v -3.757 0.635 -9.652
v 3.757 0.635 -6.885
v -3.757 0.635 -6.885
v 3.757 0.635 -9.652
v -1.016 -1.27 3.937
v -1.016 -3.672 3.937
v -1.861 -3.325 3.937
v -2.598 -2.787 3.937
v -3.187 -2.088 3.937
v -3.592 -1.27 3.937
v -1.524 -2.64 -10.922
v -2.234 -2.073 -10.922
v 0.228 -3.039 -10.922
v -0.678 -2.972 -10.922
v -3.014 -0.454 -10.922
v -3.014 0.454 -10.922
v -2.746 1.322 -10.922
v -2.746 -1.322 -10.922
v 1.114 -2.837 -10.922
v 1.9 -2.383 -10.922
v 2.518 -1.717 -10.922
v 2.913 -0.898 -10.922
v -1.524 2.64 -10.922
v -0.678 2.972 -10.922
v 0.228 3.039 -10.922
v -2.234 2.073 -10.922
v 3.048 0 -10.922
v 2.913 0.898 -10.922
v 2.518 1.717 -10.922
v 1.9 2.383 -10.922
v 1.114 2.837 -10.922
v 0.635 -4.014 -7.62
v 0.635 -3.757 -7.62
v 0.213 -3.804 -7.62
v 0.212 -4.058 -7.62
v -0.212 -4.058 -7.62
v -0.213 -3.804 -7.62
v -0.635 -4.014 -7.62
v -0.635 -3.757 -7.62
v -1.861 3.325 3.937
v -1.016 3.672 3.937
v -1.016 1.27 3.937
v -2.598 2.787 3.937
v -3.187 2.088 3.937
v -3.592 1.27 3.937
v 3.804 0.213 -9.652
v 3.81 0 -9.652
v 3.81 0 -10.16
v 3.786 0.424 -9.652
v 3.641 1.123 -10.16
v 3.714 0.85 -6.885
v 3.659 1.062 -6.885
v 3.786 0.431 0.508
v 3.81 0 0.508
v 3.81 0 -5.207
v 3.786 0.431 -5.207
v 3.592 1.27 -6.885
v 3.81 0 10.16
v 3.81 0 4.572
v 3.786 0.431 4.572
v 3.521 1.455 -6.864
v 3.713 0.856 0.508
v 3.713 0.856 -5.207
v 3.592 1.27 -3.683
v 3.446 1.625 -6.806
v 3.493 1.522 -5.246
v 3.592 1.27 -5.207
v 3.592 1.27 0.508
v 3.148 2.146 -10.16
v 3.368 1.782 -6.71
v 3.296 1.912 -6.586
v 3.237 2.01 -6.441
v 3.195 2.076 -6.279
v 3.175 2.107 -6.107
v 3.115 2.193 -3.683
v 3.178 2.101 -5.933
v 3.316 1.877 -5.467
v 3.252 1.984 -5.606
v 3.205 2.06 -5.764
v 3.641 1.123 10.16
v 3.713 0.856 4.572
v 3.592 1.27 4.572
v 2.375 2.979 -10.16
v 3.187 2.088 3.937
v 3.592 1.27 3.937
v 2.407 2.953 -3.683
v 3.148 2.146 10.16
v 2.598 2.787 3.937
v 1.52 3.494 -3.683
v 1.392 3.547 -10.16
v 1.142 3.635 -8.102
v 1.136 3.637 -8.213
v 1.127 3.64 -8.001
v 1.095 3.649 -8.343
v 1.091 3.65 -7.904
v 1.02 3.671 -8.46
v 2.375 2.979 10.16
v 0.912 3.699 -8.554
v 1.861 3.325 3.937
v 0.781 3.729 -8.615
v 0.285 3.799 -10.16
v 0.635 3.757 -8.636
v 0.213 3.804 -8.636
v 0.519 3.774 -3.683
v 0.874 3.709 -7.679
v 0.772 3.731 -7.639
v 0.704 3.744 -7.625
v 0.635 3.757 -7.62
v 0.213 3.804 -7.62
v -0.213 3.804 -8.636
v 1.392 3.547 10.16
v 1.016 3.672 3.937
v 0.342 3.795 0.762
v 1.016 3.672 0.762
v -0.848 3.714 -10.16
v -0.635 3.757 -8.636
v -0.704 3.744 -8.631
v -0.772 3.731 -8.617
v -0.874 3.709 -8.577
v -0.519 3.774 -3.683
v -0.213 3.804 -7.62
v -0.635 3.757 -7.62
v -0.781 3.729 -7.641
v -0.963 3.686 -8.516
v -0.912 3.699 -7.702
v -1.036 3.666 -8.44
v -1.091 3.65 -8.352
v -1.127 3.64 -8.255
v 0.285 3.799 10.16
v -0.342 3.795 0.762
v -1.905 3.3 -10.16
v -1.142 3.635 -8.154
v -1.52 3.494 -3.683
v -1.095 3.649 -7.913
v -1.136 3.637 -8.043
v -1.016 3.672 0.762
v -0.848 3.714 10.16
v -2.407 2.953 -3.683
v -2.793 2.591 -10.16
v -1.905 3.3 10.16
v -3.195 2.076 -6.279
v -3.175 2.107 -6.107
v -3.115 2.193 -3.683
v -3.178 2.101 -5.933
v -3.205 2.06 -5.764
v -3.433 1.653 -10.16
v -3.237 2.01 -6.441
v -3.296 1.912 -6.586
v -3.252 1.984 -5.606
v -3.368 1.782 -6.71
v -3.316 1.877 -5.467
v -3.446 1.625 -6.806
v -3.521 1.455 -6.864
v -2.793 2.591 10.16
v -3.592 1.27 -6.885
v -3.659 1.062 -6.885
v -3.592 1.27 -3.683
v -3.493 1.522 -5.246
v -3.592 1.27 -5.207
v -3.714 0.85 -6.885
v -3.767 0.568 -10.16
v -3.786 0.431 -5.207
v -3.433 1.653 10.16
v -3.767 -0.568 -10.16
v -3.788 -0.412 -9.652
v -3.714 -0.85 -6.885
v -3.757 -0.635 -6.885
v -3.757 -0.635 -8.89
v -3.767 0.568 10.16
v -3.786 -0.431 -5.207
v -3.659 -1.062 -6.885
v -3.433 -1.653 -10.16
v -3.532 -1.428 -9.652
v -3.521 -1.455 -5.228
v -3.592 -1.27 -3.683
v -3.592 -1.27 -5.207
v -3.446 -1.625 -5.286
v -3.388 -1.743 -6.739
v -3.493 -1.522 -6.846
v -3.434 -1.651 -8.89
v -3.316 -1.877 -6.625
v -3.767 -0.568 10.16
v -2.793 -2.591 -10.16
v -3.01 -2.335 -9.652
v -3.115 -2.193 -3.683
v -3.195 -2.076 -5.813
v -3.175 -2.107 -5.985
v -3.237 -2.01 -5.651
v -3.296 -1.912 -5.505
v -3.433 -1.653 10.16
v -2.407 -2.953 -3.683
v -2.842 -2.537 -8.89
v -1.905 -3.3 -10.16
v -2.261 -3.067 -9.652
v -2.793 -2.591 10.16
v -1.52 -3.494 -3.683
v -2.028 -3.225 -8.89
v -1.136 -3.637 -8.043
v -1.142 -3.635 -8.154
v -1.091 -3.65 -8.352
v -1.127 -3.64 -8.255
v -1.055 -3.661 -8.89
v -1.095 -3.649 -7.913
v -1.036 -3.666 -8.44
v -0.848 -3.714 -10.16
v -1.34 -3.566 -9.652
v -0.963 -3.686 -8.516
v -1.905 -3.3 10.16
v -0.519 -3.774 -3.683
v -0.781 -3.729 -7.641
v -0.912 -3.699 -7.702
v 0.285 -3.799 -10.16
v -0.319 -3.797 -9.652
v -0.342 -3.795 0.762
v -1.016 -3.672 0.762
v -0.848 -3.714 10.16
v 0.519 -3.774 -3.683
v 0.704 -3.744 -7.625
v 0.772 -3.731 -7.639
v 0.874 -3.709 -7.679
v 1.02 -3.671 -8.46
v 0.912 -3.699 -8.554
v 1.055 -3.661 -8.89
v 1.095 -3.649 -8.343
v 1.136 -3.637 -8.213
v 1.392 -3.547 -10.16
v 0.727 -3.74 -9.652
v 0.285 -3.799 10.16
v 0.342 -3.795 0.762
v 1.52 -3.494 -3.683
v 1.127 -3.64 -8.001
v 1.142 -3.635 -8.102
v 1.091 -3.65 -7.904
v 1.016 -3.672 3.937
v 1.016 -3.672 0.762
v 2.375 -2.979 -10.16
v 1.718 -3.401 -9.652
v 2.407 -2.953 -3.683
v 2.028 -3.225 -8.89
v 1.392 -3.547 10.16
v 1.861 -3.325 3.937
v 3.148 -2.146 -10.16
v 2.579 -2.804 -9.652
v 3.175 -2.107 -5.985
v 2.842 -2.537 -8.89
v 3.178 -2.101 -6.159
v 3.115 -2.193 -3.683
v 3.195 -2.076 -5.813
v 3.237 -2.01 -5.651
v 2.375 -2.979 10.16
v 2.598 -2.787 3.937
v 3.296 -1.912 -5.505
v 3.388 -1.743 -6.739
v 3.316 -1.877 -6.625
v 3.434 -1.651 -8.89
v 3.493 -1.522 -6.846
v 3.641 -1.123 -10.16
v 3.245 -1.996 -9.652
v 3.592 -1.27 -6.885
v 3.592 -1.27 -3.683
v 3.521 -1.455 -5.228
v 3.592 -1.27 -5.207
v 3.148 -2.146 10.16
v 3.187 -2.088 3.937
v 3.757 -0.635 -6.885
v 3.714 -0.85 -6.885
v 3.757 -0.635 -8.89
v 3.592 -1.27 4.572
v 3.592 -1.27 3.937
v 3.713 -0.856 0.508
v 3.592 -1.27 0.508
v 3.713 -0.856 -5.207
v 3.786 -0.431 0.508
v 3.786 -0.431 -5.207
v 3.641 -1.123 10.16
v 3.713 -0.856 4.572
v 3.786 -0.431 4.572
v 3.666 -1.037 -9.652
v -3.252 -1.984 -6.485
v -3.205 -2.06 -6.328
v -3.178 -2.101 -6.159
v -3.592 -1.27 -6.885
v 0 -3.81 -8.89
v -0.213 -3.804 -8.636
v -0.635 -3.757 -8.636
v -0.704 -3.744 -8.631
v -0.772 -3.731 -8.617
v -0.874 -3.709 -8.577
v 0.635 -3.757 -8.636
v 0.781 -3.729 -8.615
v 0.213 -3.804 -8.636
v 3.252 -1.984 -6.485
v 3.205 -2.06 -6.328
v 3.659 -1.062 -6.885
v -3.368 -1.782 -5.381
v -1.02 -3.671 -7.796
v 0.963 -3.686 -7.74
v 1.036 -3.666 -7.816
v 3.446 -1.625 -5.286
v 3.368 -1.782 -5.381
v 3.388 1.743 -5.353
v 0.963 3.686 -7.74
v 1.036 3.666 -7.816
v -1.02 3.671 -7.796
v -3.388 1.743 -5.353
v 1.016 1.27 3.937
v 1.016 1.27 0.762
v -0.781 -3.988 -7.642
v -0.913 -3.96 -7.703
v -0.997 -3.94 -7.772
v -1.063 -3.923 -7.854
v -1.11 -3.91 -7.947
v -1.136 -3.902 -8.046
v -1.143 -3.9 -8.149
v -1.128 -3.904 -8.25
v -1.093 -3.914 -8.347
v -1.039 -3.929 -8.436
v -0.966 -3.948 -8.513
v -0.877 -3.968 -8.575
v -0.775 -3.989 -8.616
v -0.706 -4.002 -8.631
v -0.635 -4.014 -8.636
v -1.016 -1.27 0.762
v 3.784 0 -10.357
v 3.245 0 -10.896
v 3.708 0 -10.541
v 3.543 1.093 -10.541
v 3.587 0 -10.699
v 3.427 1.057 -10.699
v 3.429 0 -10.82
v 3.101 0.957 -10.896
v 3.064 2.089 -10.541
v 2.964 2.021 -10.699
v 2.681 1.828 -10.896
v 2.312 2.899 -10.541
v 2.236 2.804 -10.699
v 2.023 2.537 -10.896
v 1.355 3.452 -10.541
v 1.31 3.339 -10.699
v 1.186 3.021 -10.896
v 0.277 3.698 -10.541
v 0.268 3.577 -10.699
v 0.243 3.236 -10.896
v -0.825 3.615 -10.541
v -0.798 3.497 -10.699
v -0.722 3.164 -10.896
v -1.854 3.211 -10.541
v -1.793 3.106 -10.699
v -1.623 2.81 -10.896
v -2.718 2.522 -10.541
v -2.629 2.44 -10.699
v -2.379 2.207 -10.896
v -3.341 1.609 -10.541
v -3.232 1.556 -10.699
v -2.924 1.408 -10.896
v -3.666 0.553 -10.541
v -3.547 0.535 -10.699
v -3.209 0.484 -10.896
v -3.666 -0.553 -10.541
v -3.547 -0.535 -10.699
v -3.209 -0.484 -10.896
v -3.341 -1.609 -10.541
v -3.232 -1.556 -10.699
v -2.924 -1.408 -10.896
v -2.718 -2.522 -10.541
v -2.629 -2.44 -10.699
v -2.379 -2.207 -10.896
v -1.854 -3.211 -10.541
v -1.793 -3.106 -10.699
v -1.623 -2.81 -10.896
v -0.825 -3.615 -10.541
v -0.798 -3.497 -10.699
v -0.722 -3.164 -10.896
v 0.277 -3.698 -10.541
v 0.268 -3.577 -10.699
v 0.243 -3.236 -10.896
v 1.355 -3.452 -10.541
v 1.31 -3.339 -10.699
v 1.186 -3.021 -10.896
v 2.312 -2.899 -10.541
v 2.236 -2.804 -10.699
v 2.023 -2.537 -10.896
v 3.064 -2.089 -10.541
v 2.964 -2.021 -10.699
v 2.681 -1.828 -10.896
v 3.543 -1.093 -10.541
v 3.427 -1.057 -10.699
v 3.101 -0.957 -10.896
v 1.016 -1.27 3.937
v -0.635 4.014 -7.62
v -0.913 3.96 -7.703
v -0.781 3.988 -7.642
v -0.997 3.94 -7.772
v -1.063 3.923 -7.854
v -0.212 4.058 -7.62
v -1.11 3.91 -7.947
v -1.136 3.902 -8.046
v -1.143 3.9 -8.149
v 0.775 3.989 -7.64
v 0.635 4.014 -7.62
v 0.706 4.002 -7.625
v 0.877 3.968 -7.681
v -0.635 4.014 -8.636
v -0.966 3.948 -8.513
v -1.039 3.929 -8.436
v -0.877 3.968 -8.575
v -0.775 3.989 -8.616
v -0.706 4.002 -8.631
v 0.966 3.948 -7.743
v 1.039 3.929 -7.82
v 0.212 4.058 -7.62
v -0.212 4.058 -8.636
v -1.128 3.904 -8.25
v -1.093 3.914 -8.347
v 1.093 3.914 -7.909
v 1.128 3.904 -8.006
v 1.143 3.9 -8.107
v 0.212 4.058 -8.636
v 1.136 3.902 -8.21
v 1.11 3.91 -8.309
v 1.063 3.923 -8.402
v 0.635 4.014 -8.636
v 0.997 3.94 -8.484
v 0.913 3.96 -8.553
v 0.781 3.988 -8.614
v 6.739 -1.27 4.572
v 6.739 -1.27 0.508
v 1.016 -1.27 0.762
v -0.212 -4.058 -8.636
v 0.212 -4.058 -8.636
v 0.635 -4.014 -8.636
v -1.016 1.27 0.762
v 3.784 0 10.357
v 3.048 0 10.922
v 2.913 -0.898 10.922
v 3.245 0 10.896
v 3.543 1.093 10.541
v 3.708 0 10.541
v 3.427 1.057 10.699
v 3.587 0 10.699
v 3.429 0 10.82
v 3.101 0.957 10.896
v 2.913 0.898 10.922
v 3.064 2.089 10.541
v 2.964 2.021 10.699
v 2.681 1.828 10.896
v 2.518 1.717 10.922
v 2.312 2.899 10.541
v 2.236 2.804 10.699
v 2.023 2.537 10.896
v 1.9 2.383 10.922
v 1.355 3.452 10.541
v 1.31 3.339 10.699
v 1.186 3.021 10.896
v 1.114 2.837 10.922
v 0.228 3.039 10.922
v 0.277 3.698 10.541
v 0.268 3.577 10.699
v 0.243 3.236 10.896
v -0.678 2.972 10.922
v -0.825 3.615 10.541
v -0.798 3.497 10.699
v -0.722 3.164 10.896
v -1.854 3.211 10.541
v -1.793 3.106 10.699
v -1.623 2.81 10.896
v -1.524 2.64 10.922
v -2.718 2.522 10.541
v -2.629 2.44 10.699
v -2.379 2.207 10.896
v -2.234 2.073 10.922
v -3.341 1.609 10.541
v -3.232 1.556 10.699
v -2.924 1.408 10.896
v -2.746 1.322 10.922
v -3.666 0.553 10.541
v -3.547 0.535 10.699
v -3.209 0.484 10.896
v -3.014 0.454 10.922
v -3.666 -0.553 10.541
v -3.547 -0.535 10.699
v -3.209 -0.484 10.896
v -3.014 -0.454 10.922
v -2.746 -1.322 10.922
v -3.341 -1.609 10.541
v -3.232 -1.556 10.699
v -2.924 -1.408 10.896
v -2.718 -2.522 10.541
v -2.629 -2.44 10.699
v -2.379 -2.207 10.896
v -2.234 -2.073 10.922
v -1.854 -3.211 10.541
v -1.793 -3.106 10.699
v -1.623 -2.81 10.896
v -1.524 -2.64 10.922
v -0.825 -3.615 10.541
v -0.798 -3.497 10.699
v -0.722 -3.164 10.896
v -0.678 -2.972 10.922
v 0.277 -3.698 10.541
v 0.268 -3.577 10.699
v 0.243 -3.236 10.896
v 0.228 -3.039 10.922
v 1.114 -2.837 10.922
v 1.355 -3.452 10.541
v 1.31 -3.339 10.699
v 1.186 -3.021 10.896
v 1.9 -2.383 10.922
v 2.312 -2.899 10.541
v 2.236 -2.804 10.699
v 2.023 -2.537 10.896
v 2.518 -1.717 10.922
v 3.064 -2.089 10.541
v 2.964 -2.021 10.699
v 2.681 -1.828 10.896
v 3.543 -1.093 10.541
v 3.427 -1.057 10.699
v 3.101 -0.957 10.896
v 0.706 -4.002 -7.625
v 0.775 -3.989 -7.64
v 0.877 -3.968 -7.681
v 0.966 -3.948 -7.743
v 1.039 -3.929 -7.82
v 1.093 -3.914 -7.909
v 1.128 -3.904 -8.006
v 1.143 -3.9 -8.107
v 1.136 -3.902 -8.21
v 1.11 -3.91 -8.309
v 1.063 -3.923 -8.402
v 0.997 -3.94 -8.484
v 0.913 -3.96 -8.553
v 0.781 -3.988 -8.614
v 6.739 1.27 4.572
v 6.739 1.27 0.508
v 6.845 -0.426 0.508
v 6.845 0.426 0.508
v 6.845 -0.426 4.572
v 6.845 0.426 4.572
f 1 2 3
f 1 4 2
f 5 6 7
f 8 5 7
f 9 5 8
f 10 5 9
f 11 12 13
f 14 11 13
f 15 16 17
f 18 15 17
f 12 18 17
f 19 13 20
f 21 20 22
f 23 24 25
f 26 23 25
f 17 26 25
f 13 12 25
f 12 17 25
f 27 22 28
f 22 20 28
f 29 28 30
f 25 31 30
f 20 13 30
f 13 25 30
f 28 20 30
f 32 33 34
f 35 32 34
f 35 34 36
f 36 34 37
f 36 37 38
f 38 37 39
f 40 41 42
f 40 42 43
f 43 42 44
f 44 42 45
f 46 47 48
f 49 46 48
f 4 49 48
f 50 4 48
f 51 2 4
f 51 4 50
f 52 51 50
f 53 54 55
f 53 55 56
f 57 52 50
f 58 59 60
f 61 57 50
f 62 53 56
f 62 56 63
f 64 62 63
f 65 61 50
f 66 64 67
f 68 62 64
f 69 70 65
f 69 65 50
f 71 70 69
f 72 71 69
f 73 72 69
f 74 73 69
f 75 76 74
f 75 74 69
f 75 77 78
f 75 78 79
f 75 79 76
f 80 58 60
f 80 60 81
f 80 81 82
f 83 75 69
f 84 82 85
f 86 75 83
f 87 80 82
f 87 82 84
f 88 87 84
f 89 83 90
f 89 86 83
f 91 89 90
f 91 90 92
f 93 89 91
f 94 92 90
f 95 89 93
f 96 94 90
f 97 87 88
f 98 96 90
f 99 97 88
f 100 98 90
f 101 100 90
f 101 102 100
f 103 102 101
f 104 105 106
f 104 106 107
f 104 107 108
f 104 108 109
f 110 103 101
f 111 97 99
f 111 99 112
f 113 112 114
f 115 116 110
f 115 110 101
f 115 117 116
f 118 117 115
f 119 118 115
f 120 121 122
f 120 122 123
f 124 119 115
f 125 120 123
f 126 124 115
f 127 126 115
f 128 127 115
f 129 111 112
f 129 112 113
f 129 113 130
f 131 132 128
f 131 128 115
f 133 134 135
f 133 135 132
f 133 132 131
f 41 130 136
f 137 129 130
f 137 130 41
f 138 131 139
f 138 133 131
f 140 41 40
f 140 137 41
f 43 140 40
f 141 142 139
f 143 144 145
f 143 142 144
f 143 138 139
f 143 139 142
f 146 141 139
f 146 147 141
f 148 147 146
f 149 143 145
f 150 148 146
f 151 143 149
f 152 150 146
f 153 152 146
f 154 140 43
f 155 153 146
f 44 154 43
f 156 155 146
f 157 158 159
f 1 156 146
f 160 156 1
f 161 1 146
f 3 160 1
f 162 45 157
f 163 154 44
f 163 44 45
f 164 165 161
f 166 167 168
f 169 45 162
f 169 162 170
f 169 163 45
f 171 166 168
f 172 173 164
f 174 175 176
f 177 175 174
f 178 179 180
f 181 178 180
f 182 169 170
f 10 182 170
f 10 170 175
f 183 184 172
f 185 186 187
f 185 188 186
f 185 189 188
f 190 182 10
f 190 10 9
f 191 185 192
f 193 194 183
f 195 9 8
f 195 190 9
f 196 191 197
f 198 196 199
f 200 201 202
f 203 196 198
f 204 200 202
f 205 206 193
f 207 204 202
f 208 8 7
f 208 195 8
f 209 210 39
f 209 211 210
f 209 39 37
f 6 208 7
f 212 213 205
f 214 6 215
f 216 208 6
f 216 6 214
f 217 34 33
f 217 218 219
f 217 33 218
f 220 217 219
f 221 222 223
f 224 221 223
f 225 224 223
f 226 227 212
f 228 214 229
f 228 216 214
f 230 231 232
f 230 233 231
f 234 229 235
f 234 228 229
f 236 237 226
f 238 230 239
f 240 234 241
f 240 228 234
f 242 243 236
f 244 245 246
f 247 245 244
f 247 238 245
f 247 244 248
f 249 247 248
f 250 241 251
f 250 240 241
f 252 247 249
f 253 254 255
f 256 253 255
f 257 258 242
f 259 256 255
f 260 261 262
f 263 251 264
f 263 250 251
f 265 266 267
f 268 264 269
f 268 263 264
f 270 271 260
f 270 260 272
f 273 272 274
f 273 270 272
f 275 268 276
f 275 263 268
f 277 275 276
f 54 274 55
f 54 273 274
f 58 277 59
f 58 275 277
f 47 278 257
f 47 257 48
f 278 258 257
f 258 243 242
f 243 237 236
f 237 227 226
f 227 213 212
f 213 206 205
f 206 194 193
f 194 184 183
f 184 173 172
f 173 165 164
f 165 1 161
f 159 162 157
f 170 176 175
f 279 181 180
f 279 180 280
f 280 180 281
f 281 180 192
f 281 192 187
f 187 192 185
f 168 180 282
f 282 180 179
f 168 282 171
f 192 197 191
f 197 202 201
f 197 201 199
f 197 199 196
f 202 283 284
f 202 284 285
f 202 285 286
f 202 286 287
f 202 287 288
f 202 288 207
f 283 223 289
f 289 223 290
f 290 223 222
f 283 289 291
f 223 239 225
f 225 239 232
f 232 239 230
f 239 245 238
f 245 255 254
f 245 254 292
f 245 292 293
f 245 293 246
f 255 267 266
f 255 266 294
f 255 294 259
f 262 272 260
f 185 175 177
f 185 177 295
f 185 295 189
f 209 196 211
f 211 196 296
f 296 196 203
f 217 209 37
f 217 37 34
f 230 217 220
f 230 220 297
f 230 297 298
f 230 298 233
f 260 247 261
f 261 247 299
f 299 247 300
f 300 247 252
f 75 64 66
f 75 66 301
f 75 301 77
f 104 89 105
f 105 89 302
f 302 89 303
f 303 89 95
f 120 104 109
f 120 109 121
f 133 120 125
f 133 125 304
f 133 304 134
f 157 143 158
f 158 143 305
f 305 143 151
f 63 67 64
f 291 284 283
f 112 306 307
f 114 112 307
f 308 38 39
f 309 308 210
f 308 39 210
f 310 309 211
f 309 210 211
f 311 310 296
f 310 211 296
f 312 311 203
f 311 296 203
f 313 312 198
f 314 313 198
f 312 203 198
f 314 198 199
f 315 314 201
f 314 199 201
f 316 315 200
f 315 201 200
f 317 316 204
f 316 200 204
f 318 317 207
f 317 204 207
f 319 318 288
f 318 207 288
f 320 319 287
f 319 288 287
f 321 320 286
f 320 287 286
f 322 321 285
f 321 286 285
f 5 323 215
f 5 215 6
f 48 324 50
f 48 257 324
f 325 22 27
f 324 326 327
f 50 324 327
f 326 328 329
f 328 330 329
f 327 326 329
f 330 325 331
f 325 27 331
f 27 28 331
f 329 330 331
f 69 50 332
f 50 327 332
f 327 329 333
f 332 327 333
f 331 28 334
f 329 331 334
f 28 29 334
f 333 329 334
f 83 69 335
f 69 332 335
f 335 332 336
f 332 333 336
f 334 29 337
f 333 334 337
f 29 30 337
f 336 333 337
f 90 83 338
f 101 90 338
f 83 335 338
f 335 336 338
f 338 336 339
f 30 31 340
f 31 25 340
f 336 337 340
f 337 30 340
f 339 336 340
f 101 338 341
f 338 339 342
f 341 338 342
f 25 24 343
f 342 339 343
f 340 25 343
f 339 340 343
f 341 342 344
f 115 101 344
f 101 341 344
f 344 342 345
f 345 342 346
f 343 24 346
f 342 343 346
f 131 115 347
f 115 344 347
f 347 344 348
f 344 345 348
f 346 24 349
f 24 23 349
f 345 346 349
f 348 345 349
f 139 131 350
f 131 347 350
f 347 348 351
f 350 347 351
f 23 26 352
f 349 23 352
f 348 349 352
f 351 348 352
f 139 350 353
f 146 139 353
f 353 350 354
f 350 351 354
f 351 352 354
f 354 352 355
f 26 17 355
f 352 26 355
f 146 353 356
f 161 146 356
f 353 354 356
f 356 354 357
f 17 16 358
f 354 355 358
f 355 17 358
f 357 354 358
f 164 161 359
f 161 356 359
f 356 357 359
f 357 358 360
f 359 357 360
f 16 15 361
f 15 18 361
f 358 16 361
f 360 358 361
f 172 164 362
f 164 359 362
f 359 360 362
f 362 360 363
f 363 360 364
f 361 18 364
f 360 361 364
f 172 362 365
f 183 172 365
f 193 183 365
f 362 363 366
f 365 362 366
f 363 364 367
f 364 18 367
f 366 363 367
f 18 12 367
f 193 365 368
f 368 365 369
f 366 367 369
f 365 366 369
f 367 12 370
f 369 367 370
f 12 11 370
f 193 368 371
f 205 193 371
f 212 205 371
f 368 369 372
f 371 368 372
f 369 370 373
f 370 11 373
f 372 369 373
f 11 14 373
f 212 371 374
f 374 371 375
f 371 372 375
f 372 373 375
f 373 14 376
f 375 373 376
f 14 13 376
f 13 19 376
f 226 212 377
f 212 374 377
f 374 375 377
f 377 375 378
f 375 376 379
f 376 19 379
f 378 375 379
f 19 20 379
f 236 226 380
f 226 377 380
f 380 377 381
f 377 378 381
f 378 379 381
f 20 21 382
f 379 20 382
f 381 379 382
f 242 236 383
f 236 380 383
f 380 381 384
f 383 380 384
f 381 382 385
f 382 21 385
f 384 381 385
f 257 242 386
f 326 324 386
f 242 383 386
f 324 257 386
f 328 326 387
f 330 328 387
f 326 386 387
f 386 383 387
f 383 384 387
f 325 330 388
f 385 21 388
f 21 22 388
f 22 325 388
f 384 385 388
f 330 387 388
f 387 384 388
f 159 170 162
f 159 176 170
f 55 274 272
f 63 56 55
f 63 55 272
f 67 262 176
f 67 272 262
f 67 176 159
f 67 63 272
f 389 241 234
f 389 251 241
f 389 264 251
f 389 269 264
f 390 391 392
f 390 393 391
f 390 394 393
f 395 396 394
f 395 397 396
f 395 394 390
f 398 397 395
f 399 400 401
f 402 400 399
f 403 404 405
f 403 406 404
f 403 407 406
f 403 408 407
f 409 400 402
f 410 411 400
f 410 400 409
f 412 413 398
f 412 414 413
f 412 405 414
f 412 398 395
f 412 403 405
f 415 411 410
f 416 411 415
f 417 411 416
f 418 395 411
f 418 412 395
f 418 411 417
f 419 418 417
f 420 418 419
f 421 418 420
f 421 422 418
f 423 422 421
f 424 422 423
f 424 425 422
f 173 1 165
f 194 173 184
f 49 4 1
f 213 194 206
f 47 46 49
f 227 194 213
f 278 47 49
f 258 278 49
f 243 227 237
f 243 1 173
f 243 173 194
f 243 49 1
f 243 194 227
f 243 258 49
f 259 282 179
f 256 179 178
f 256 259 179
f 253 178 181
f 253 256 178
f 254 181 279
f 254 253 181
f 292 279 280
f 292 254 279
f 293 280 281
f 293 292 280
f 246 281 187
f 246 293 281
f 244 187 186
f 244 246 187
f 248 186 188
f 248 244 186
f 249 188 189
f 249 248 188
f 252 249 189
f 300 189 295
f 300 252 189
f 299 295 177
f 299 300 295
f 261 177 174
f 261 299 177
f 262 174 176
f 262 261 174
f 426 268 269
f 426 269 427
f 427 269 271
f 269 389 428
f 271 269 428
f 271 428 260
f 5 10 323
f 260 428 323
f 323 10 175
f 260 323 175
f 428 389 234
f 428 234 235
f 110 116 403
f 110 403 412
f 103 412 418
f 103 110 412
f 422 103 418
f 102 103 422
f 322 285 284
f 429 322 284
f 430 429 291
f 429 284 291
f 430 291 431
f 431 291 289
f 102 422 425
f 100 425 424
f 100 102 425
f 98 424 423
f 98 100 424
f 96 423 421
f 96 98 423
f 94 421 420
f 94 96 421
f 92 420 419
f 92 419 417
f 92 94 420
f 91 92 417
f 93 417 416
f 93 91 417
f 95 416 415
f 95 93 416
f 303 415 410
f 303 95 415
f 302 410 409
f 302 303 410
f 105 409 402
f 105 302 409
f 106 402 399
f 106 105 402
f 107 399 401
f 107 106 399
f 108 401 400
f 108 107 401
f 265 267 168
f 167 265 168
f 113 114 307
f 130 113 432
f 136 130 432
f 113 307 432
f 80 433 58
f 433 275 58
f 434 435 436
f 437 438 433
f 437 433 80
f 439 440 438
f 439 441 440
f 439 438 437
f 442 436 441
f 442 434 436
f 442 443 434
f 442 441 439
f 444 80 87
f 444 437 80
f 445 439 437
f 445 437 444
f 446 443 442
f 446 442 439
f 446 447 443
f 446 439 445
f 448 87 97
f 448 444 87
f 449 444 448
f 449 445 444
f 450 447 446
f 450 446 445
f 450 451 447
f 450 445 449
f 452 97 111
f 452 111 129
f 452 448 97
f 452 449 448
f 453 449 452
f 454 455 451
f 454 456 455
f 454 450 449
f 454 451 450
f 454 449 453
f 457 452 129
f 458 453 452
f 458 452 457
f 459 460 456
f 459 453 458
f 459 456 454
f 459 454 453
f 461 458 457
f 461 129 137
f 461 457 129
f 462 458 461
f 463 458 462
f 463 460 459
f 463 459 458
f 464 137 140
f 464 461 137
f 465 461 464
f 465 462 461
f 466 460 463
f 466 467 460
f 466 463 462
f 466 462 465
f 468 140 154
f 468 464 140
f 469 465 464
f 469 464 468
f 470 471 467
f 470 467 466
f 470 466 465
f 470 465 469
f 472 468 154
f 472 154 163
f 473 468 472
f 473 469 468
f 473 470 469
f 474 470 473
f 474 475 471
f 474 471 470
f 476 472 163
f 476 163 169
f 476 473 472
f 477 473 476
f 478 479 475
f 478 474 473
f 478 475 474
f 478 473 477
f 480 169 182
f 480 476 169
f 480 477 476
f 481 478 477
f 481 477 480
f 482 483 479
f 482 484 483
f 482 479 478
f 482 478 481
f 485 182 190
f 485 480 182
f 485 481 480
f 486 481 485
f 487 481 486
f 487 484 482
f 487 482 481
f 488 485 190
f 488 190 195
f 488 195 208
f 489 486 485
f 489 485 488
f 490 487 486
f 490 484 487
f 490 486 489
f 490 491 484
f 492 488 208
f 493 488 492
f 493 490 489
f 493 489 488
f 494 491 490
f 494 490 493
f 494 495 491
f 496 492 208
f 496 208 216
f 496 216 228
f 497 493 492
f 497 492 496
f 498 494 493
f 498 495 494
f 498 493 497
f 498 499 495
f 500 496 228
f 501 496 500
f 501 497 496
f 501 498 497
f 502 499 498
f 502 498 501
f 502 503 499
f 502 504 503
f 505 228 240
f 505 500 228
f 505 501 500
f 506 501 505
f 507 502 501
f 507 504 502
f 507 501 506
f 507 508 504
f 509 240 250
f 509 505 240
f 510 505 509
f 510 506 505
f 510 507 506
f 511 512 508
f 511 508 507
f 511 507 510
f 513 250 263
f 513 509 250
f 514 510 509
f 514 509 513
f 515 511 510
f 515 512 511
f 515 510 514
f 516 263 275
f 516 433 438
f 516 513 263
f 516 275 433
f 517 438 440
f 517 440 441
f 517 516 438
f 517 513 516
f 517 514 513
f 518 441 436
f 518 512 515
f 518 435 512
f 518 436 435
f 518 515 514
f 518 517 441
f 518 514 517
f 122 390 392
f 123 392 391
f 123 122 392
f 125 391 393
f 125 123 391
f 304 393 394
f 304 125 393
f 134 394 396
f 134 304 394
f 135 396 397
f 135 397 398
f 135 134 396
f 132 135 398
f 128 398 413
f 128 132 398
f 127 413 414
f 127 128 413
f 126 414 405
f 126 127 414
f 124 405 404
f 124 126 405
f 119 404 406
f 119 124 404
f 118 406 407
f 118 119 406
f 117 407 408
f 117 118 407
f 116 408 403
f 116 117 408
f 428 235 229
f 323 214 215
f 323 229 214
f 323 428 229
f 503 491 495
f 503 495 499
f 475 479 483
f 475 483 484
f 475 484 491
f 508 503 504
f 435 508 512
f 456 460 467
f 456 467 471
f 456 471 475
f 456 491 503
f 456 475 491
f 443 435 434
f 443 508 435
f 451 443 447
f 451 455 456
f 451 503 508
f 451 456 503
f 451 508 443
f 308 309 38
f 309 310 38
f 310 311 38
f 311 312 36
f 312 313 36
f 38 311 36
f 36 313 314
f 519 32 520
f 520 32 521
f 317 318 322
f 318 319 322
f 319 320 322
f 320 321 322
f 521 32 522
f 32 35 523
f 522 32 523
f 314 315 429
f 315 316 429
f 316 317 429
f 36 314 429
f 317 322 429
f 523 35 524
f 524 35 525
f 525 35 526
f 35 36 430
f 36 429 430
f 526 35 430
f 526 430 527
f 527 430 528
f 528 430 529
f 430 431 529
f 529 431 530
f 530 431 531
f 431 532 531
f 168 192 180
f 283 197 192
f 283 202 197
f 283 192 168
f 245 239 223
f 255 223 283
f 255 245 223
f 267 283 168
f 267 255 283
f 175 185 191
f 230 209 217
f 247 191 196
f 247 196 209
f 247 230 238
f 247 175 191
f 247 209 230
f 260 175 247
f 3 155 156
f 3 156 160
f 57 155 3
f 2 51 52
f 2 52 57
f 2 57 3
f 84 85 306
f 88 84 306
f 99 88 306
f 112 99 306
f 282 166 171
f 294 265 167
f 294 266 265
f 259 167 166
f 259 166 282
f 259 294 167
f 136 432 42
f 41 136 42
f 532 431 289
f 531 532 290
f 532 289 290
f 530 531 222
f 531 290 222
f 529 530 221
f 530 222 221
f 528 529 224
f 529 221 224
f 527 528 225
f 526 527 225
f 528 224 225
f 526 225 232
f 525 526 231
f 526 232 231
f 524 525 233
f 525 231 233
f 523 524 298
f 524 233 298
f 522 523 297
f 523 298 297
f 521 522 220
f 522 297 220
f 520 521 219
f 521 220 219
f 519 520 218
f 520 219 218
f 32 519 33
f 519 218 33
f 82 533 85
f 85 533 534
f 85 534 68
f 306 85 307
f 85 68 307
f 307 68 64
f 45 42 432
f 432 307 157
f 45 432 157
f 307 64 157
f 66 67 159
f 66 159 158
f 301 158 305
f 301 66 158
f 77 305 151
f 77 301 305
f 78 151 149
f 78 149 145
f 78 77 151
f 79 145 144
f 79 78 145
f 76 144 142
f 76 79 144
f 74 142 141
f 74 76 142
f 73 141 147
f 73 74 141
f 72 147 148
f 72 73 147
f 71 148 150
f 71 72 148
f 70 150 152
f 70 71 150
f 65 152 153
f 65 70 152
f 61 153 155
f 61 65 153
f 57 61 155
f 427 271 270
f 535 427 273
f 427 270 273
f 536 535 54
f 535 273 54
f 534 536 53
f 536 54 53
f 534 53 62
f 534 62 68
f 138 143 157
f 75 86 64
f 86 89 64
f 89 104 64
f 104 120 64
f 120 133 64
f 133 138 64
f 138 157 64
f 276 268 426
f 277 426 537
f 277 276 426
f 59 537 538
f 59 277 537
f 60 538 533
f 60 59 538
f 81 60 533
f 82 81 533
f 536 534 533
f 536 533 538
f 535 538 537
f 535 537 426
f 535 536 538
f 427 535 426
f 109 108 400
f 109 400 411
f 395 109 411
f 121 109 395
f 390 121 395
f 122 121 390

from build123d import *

# Parameters (mm, degrees)
SKETCH1_R                = 3.81
BOSS_EXTRUDE1_DEPTH      = 10.922
CUT_EXTRUDE1_DEPTH       = 13.633787397
CUT_EXTRUDE2_DEPTH       = 10.922
BOSS_EXTRUDE2_REACH      = 14.179
BOSS_EXTRUDE2_END_RADIUS = 6.858
SKETCH4_W                = 4.064
SKETCH4_H                = 2.54
BOSS_EXTRUDE3_REACH      = 15.641
BOSS_EXTRUDE3_END_RADIUS = 4.064
FILLET1_R                = 0.762


with BuildPart() as part:
    # Sketch1 → Boss-Extrude1 (new, symmetric)
    with BuildSketch(Plane.XY):
        Circle(SKETCH1_R)
    extrude(amount=BOSS_EXTRUDE1_DEPTH, both=True)

    # Sketch2 → Cut-Extrude1 (cut, through all)
    with BuildSketch(Plane(origin=(0, 1.27, 0), x_dir=(1, 0, 0), z_dir=(0, 1, 0))):
        Polygon((-3.81, 3.683), (3.81, 3.683), (3.81, -3.937), (1.016, -3.937), (1.016, -0.762), (-1.016, -0.762), (-1.016, -3.937), (-3.81, -3.937), align=None)
    cut_extrude1 = extrude(amount=CUT_EXTRUDE1_DEPTH, mode=Mode.SUBTRACT)

    # Mirror1: Cut-Extrude1 across plane
    add(cut_extrude1.mirror(Plane.ZX), mode=Mode.SUBTRACT)

    # Sketch3 → Cut-Extrude2 (cut, symmetric)
    with BuildSketch(Plane(origin=(0, 0, 0), x_dir=(0, 0, -1), z_dir=(1, 0, 0))):
        with BuildLine():
            Line((5.207, -1.27), (5.207, 1.27))
            ThreePointArc((5.207, 1.27), (6.045841446, 2.108841446), (6.884682892, 1.27))
            Line((6.884682892, 1.27), (6.884682892, 0.635))
            Line((6.884682892, 0.635), (9.652, 0.635))
            Line((9.652, 0.635), (9.652, -3.81))
            Line((9.652, -3.81), (8.89, -3.81))
            Line((8.89, -3.81), (8.89, -0.635))
            Line((8.89, -0.635), (6.884682892, -0.635))
            Line((6.884682892, -0.635), (6.884682892, -1.27))
            ThreePointArc((6.884682892, -1.27), (6.045841446, -2.108841446), (5.207, -1.27))
        make_face()
    extrude(amount=CUT_EXTRUDE2_DEPTH, both=True, mode=Mode.SUBTRACT)

    # Boss-Extrude2: up to this cylinder (the profile starts inside it)
    boss_extrude2_end = Plane(origin=(0, 0, 2.54), z_dir=(0, 0, -1)) * Cylinder(BOSS_EXTRUDE2_END_RADIUS, 43.074, mode=Mode.PRIVATE)
    # Sketch4 → Boss-Extrude2 (add, up to the surface)
    with BuildSketch(Plane(origin=(0, 0, 0), x_dir=(0, 0, -1), z_dir=(1, 0, 0)), mode=Mode.PRIVATE) as boss_extrude2_sk1:
        with Locations((-2.54, 0)):
            Rectangle(SKETCH4_W, SKETCH4_H)
    boss_extrude2_tool1 = extrude(boss_extrude2_sk1.sketch, amount=BOSS_EXTRUDE2_REACH, mode=Mode.PRIVATE) & boss_extrude2_end
    add(boss_extrude2_tool1.solids().sort_by_distance((0, 0, 2.54))[0])

    # Boss-Extrude3: up to this cylinder (the profile starts inside it)
    boss_extrude3_end = Plane(origin=(0, 0, -8.128), z_dir=(0, 0, -1)) * Cylinder(BOSS_EXTRUDE3_END_RADIUS, 40.41, mode=Mode.PRIVATE)
    # Sketch5 → Boss-Extrude3 (add, up to the surface)
    with BuildSketch(Plane(origin=(0, 0.635, 0), x_dir=(1, 0, 0), z_dir=(0, 1, 0)), mode=Mode.PRIVATE) as boss_extrude3_sk1:
        with BuildLine():
            Line((-0.635, 8.636), (0.635, 8.636))
            ThreePointArc((0.635, 8.636), (1.143, 8.128), (0.635, 7.62))
            Line((0.635, 7.62), (-0.635, 7.62))
            ThreePointArc((-0.635, 7.62), (-1.143, 8.128), (-0.635, 8.636))
        make_face()
    boss_extrude3_tool1 = extrude(boss_extrude3_sk1.sketch, amount=BOSS_EXTRUDE3_REACH, mode=Mode.PRIVATE) & boss_extrude3_end
    boss_extrude3 = boss_extrude3_tool1.solids().sort_by_distance((0, 0.635, -8.128))[0]
    add(boss_extrude3)

    # Mirror2: Boss-Extrude3 across plane
    add(boss_extrude3.mirror(Plane.ZX))

    # Fillet1
    fillet1_edges = [part.edges().sort_by_distance(p)[0] for p in [
        (-3.81, 0, -10.922),
        (-3.81, 0, 10.922),
    ]]
    fillet(fillet1_edges, radius=FILLET1_R)


solid = part.part
